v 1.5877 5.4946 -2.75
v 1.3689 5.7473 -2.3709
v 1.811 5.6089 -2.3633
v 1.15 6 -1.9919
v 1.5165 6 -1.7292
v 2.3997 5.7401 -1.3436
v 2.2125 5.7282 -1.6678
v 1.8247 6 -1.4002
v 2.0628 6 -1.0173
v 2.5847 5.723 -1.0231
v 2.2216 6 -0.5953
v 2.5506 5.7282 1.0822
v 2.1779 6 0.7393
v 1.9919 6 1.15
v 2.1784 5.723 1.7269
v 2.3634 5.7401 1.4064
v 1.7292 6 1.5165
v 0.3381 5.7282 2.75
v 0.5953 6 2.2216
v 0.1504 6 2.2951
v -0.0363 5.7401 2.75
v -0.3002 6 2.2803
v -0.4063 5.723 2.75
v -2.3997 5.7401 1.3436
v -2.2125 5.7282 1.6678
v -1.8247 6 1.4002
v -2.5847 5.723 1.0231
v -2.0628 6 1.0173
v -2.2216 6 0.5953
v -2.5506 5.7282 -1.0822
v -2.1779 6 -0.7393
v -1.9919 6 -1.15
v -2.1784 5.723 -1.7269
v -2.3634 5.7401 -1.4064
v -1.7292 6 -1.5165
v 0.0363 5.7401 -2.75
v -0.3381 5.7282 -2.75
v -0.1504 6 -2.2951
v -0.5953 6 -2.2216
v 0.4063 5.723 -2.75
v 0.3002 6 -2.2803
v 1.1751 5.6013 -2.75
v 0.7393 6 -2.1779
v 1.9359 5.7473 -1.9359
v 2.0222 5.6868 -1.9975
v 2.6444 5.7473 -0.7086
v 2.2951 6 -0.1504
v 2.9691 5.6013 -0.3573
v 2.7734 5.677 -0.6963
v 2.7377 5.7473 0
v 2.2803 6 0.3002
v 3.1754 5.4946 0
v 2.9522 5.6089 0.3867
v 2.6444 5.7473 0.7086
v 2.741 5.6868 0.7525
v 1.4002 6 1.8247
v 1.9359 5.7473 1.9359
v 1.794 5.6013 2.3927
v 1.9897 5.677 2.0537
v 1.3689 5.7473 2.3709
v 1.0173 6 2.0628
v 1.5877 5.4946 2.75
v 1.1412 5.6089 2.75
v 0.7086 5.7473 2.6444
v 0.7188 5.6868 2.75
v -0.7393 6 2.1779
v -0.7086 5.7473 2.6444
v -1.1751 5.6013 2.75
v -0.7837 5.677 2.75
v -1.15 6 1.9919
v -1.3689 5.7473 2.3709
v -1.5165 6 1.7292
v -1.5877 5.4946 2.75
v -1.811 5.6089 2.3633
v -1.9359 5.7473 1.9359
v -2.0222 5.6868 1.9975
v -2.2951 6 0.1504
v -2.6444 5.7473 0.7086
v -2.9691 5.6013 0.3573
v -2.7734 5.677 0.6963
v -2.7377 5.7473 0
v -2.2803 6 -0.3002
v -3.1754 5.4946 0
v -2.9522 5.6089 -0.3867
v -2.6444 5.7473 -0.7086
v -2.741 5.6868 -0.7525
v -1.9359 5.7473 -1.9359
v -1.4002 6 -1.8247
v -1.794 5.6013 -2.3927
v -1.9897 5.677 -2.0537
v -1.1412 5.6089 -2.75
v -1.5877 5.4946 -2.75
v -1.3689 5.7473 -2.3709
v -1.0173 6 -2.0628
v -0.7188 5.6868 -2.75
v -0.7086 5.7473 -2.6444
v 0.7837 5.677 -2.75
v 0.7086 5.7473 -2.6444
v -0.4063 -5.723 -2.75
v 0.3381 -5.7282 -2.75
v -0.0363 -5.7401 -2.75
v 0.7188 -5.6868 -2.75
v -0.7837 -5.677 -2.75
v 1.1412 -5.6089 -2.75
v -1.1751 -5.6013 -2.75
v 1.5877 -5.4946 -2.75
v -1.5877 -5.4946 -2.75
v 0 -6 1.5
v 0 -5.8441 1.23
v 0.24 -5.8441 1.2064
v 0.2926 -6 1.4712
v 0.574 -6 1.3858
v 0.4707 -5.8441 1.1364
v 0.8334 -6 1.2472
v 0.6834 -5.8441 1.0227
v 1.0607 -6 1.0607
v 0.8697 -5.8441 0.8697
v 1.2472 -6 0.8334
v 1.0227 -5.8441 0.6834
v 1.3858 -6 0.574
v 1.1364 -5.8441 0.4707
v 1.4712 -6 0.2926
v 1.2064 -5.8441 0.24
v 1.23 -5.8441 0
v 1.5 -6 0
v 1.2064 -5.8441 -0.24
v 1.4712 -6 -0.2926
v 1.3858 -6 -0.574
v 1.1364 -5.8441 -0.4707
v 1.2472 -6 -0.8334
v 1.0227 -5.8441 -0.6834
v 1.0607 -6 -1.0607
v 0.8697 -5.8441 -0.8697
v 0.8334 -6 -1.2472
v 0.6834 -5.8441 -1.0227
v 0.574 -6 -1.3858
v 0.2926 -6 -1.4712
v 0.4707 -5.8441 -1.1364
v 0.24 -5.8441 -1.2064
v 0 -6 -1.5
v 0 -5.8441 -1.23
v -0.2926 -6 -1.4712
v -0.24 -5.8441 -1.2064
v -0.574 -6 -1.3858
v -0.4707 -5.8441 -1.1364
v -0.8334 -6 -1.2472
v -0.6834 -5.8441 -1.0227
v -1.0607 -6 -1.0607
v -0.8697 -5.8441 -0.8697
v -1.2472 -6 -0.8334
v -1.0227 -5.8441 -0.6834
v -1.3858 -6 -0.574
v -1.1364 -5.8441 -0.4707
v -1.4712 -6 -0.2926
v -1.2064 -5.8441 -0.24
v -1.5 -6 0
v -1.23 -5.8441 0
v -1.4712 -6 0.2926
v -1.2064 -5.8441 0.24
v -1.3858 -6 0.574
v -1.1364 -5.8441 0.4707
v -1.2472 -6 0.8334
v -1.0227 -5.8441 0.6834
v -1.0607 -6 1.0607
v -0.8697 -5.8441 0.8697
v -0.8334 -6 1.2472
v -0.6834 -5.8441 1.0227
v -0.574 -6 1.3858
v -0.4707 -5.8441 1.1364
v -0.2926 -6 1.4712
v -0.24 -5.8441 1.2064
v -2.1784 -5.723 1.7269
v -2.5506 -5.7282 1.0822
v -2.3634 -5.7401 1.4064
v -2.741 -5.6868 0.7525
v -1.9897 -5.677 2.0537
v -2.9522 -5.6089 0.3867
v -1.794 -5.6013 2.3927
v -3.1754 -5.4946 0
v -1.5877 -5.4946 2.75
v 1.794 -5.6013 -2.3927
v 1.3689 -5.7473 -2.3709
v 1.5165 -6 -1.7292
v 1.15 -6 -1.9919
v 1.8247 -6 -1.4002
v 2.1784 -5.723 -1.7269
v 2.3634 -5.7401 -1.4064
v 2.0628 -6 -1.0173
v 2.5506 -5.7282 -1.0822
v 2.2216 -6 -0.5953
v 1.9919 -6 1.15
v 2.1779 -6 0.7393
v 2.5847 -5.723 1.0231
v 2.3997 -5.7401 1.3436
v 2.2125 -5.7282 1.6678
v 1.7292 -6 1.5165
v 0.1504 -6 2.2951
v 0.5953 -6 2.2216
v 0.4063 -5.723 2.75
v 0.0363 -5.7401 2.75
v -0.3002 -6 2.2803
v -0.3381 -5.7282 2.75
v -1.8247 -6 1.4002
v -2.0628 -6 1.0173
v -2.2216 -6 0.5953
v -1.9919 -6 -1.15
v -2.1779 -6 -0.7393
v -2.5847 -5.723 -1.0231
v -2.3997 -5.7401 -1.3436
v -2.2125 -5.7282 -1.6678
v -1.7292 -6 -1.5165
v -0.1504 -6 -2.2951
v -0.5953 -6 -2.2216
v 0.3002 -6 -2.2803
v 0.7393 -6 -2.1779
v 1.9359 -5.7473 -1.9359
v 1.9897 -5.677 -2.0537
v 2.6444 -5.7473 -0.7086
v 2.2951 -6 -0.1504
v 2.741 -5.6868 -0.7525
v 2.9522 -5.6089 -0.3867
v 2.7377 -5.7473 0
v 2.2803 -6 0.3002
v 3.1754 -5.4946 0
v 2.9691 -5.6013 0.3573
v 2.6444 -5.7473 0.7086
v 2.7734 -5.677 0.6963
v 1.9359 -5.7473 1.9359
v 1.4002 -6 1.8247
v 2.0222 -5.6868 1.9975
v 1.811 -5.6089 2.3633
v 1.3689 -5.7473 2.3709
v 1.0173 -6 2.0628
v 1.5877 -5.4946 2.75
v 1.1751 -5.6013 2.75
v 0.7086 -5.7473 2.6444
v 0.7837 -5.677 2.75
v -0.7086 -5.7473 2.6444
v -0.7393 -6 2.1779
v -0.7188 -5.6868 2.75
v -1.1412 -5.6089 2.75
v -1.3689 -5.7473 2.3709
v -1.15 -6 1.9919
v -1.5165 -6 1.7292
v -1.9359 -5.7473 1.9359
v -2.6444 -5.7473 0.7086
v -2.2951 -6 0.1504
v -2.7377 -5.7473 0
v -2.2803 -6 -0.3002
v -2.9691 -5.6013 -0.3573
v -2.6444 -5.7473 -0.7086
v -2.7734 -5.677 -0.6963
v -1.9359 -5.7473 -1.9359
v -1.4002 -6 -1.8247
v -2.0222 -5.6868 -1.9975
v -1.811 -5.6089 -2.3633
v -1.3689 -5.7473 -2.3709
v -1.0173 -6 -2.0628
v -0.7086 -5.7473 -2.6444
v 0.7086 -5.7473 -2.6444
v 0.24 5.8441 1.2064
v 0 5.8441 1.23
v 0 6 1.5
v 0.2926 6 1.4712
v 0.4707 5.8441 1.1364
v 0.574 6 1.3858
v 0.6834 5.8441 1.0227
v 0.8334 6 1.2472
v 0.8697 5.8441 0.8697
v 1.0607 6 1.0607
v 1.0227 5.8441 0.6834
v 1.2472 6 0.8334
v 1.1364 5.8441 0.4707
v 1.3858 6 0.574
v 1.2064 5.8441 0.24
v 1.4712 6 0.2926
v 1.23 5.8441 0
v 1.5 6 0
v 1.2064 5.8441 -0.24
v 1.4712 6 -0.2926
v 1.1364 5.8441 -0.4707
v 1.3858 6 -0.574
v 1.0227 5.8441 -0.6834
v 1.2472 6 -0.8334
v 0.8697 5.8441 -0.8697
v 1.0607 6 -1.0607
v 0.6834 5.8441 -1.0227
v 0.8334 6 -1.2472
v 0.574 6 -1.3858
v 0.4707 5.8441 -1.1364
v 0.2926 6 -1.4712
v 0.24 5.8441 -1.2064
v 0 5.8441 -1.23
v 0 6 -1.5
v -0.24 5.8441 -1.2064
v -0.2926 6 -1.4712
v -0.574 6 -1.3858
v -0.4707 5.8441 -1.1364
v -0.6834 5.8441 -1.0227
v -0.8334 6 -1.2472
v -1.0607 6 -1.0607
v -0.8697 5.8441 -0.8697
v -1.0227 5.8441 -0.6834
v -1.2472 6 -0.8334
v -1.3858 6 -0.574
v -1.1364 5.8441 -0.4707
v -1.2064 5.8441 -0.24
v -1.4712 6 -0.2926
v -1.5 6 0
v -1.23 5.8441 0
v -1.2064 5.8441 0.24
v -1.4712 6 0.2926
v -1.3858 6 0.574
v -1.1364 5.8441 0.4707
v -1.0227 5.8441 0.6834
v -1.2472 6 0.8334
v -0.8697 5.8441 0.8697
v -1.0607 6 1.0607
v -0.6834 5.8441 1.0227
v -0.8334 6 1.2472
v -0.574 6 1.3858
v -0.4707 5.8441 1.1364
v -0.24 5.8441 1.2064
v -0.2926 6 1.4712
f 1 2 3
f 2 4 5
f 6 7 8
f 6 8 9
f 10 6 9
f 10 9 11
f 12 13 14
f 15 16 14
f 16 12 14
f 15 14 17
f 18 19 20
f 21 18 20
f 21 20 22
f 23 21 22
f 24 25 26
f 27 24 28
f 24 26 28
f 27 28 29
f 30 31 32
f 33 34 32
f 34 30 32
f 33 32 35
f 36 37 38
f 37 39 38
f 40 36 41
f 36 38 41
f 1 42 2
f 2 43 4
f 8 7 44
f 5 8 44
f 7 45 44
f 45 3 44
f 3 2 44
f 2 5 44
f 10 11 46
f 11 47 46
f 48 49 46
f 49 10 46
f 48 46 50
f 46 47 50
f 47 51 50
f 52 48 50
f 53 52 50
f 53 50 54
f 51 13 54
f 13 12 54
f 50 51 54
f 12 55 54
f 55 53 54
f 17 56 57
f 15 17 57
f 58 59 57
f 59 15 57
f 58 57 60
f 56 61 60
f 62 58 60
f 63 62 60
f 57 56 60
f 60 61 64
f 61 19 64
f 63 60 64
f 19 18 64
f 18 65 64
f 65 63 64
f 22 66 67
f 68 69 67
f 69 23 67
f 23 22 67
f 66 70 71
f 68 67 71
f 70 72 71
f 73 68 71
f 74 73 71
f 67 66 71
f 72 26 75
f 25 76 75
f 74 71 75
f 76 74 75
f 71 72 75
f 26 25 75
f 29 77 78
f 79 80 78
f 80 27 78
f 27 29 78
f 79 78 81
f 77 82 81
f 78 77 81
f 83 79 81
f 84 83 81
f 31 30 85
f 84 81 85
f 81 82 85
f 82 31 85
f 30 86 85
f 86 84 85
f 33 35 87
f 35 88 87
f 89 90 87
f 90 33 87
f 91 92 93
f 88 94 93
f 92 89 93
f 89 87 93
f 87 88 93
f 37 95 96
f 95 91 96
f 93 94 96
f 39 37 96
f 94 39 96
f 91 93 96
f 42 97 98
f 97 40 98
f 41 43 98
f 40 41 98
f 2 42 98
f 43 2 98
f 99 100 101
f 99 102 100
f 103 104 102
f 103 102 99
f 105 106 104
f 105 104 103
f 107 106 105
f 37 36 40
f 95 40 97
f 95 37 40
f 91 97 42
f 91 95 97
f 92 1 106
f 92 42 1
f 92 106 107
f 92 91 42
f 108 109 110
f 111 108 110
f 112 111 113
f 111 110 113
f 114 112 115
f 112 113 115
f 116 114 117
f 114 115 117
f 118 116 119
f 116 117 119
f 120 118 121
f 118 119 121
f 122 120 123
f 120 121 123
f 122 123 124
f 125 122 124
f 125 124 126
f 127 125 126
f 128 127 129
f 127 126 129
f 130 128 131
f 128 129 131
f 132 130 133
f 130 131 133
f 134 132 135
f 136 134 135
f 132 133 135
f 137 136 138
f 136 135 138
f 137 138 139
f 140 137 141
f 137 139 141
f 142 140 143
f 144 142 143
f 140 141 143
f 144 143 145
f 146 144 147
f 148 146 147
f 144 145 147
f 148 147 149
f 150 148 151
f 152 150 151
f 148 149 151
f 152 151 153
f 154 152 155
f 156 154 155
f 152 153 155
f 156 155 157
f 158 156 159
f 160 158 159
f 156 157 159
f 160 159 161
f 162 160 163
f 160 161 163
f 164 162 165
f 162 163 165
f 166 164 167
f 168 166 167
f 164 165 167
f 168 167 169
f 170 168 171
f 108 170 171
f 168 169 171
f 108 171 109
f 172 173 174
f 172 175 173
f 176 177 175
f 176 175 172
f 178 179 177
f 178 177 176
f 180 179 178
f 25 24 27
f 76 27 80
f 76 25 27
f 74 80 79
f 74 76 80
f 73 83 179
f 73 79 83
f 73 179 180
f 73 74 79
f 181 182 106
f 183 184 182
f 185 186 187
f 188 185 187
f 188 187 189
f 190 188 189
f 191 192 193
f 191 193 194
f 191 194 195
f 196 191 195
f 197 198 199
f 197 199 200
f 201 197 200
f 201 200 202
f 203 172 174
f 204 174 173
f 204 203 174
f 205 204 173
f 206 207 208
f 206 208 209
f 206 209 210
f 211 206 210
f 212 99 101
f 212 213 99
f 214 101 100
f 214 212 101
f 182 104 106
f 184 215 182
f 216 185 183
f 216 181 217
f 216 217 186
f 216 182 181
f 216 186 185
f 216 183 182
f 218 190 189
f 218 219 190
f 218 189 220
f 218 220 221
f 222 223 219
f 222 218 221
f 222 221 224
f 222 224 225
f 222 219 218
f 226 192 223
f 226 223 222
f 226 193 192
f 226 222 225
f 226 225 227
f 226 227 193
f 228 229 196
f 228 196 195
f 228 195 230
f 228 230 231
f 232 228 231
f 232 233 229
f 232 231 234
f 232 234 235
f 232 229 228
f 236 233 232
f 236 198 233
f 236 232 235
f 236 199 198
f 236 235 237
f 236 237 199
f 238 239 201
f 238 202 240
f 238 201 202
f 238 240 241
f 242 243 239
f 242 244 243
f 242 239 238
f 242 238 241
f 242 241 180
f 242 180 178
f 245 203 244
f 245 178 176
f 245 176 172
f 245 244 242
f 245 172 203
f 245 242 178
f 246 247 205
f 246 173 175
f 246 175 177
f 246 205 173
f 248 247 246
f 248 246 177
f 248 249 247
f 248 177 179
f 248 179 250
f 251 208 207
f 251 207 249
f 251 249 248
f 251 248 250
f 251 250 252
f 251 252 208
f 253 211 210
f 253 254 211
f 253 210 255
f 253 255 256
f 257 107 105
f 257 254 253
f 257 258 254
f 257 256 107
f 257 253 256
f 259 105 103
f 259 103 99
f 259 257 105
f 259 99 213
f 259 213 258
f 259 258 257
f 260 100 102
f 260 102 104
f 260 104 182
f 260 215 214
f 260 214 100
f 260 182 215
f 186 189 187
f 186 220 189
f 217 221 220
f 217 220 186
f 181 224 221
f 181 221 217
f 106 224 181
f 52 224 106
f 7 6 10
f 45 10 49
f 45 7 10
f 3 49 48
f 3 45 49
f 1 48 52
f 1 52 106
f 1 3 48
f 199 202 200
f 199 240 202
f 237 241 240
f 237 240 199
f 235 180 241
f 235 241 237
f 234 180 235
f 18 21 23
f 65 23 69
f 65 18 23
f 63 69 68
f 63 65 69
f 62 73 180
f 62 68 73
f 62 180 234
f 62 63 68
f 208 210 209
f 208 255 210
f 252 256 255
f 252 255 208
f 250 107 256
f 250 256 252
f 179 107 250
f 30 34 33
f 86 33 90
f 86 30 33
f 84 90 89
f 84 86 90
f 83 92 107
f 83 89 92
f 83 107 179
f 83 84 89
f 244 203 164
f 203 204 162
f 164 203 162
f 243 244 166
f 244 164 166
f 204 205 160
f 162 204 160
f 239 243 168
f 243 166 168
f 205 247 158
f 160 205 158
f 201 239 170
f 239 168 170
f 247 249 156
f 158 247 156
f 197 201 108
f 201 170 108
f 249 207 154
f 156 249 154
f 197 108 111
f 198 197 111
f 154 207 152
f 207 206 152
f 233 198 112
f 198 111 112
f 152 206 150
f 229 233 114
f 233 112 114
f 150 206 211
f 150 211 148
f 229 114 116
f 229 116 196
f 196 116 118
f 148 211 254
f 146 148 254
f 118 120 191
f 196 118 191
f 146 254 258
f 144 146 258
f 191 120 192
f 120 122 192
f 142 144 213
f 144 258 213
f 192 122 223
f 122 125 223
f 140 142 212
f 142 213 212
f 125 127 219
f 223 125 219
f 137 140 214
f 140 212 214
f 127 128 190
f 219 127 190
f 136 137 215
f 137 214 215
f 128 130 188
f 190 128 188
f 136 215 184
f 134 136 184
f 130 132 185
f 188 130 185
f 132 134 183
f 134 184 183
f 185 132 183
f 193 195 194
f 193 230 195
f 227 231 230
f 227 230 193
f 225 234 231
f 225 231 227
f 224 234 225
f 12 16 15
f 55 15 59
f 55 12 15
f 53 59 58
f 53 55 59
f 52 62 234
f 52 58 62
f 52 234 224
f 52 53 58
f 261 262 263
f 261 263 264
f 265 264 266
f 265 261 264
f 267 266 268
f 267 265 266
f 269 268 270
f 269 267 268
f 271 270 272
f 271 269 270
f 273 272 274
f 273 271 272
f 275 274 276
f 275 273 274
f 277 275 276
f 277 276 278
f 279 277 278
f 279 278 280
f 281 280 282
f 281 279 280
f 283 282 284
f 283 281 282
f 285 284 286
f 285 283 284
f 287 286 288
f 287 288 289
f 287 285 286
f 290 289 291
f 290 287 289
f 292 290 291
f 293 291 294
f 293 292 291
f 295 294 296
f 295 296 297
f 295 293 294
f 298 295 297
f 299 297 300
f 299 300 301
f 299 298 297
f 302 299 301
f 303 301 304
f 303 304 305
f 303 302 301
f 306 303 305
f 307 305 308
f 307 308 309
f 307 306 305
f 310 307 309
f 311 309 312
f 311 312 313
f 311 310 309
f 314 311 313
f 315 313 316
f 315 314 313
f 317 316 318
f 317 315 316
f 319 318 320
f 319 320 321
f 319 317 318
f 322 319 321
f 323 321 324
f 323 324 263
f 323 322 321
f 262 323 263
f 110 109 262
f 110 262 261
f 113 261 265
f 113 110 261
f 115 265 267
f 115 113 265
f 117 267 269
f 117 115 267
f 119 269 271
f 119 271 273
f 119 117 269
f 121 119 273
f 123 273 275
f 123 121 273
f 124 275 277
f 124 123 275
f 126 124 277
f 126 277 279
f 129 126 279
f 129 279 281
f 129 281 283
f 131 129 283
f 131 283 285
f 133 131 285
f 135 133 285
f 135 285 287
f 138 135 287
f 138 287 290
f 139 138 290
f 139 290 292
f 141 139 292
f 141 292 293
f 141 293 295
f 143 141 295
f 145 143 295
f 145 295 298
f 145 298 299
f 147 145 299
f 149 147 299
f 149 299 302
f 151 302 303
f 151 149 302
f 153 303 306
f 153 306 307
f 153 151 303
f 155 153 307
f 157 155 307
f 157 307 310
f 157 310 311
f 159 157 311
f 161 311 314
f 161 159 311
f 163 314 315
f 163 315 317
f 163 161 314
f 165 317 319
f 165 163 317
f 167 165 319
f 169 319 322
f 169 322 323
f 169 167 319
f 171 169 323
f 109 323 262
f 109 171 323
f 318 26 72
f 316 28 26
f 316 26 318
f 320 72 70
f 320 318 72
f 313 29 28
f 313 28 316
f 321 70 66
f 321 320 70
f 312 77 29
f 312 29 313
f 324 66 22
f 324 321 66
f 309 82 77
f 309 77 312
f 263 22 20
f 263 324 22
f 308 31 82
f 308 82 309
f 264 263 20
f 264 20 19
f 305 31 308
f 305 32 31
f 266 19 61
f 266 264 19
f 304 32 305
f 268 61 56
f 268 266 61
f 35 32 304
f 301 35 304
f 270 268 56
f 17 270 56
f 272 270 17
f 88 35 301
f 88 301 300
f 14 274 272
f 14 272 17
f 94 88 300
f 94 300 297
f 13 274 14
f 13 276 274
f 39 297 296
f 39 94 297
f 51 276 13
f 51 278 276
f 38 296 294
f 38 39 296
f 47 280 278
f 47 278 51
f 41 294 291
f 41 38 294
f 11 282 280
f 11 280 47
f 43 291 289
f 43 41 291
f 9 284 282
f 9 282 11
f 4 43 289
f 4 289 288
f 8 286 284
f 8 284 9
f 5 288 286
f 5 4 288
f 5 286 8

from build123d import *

# Parameters (mm, degrees)
SKIZZE2_R                       = 1.23
AUFSATZ_LINEAR_AUSTRAGEN1_DEPTH = 6
FASE1_SIZE                      = 0.27
FASE1_SIZE2                     = 0.155884573
FASE2_SIZE                      = 0.27
FASE2_SIZE2                     = 0.155884573


with BuildPart() as part:
    # Skizze2 → Aufsatz-Linear austragen1 (new, symmetric)
    with BuildSketch(Plane(origin=(0, 0, 0), x_dir=(1, 0, 0), z_dir=(0, 1, 0))):
        Polygon((3.175426481, 0), (1.58771324, 2.75), (-1.58771324, 2.75), (-3.175426481, 0), (-1.58771324, -2.75), (1.58771324, -2.75), align=None)
        with Locations(Location((0, 0, 0), (0, 0, 270))):
            Circle(SKIZZE2_R, mode=Mode.SUBTRACT)
    extrude(amount=AUFSATZ_LINEAR_AUSTRAGEN1_DEPTH, both=True)

    # Fase1
    fase1_edges = [part.edges().sort_by_distance(p)[0] for p in [
        (0, 6, -1.23),
    ]]
    fase1_side = [part.faces().sort_by_distance(p)[0] for p in [
        (2.308811699, 6, -1.332993056),
    ]]
    chamfer(fase1_edges, length=FASE1_SIZE, length2=FASE1_SIZE2, reference=fase1_side[0])

    # Fase2
    fase2_edges = [part.edges().sort_by_distance(p)[0] for p in [
        (0, -6, -1.23),
    ]]
    fase2_side = [part.faces().sort_by_distance(p)[0] for p in [
        (2.308811699, -6, -1.332993056),
    ]]
    chamfer(fase2_edges, length=FASE2_SIZE, length2=FASE2_SIZE2, reference=fase2_side[0])

    # Skizze3 → Schnitt-Rotation1 (revolve, cut)
    with BuildSketch(Plane.XY, mode=Mode.PRIVATE) as schnitt_rotation1_sk:
        Polygon((-2.3, 6), (-4.116867346, 6), (-4.116867346, 4.951031149), align=None)
        Polygon((-2.3, -6), (-4.116867346, -6), (-4.116867346, -4.951031149), align=None)
    revolve(schnitt_rotation1_sk.sketch.rotate(Axis((0, 5.844115427, 0), (0, -1, 0)), 119.99999992), axis=Axis((0, 5.844115427, 0), (0, -1, 0)), mode=Mode.SUBTRACT)


solid = part.part
